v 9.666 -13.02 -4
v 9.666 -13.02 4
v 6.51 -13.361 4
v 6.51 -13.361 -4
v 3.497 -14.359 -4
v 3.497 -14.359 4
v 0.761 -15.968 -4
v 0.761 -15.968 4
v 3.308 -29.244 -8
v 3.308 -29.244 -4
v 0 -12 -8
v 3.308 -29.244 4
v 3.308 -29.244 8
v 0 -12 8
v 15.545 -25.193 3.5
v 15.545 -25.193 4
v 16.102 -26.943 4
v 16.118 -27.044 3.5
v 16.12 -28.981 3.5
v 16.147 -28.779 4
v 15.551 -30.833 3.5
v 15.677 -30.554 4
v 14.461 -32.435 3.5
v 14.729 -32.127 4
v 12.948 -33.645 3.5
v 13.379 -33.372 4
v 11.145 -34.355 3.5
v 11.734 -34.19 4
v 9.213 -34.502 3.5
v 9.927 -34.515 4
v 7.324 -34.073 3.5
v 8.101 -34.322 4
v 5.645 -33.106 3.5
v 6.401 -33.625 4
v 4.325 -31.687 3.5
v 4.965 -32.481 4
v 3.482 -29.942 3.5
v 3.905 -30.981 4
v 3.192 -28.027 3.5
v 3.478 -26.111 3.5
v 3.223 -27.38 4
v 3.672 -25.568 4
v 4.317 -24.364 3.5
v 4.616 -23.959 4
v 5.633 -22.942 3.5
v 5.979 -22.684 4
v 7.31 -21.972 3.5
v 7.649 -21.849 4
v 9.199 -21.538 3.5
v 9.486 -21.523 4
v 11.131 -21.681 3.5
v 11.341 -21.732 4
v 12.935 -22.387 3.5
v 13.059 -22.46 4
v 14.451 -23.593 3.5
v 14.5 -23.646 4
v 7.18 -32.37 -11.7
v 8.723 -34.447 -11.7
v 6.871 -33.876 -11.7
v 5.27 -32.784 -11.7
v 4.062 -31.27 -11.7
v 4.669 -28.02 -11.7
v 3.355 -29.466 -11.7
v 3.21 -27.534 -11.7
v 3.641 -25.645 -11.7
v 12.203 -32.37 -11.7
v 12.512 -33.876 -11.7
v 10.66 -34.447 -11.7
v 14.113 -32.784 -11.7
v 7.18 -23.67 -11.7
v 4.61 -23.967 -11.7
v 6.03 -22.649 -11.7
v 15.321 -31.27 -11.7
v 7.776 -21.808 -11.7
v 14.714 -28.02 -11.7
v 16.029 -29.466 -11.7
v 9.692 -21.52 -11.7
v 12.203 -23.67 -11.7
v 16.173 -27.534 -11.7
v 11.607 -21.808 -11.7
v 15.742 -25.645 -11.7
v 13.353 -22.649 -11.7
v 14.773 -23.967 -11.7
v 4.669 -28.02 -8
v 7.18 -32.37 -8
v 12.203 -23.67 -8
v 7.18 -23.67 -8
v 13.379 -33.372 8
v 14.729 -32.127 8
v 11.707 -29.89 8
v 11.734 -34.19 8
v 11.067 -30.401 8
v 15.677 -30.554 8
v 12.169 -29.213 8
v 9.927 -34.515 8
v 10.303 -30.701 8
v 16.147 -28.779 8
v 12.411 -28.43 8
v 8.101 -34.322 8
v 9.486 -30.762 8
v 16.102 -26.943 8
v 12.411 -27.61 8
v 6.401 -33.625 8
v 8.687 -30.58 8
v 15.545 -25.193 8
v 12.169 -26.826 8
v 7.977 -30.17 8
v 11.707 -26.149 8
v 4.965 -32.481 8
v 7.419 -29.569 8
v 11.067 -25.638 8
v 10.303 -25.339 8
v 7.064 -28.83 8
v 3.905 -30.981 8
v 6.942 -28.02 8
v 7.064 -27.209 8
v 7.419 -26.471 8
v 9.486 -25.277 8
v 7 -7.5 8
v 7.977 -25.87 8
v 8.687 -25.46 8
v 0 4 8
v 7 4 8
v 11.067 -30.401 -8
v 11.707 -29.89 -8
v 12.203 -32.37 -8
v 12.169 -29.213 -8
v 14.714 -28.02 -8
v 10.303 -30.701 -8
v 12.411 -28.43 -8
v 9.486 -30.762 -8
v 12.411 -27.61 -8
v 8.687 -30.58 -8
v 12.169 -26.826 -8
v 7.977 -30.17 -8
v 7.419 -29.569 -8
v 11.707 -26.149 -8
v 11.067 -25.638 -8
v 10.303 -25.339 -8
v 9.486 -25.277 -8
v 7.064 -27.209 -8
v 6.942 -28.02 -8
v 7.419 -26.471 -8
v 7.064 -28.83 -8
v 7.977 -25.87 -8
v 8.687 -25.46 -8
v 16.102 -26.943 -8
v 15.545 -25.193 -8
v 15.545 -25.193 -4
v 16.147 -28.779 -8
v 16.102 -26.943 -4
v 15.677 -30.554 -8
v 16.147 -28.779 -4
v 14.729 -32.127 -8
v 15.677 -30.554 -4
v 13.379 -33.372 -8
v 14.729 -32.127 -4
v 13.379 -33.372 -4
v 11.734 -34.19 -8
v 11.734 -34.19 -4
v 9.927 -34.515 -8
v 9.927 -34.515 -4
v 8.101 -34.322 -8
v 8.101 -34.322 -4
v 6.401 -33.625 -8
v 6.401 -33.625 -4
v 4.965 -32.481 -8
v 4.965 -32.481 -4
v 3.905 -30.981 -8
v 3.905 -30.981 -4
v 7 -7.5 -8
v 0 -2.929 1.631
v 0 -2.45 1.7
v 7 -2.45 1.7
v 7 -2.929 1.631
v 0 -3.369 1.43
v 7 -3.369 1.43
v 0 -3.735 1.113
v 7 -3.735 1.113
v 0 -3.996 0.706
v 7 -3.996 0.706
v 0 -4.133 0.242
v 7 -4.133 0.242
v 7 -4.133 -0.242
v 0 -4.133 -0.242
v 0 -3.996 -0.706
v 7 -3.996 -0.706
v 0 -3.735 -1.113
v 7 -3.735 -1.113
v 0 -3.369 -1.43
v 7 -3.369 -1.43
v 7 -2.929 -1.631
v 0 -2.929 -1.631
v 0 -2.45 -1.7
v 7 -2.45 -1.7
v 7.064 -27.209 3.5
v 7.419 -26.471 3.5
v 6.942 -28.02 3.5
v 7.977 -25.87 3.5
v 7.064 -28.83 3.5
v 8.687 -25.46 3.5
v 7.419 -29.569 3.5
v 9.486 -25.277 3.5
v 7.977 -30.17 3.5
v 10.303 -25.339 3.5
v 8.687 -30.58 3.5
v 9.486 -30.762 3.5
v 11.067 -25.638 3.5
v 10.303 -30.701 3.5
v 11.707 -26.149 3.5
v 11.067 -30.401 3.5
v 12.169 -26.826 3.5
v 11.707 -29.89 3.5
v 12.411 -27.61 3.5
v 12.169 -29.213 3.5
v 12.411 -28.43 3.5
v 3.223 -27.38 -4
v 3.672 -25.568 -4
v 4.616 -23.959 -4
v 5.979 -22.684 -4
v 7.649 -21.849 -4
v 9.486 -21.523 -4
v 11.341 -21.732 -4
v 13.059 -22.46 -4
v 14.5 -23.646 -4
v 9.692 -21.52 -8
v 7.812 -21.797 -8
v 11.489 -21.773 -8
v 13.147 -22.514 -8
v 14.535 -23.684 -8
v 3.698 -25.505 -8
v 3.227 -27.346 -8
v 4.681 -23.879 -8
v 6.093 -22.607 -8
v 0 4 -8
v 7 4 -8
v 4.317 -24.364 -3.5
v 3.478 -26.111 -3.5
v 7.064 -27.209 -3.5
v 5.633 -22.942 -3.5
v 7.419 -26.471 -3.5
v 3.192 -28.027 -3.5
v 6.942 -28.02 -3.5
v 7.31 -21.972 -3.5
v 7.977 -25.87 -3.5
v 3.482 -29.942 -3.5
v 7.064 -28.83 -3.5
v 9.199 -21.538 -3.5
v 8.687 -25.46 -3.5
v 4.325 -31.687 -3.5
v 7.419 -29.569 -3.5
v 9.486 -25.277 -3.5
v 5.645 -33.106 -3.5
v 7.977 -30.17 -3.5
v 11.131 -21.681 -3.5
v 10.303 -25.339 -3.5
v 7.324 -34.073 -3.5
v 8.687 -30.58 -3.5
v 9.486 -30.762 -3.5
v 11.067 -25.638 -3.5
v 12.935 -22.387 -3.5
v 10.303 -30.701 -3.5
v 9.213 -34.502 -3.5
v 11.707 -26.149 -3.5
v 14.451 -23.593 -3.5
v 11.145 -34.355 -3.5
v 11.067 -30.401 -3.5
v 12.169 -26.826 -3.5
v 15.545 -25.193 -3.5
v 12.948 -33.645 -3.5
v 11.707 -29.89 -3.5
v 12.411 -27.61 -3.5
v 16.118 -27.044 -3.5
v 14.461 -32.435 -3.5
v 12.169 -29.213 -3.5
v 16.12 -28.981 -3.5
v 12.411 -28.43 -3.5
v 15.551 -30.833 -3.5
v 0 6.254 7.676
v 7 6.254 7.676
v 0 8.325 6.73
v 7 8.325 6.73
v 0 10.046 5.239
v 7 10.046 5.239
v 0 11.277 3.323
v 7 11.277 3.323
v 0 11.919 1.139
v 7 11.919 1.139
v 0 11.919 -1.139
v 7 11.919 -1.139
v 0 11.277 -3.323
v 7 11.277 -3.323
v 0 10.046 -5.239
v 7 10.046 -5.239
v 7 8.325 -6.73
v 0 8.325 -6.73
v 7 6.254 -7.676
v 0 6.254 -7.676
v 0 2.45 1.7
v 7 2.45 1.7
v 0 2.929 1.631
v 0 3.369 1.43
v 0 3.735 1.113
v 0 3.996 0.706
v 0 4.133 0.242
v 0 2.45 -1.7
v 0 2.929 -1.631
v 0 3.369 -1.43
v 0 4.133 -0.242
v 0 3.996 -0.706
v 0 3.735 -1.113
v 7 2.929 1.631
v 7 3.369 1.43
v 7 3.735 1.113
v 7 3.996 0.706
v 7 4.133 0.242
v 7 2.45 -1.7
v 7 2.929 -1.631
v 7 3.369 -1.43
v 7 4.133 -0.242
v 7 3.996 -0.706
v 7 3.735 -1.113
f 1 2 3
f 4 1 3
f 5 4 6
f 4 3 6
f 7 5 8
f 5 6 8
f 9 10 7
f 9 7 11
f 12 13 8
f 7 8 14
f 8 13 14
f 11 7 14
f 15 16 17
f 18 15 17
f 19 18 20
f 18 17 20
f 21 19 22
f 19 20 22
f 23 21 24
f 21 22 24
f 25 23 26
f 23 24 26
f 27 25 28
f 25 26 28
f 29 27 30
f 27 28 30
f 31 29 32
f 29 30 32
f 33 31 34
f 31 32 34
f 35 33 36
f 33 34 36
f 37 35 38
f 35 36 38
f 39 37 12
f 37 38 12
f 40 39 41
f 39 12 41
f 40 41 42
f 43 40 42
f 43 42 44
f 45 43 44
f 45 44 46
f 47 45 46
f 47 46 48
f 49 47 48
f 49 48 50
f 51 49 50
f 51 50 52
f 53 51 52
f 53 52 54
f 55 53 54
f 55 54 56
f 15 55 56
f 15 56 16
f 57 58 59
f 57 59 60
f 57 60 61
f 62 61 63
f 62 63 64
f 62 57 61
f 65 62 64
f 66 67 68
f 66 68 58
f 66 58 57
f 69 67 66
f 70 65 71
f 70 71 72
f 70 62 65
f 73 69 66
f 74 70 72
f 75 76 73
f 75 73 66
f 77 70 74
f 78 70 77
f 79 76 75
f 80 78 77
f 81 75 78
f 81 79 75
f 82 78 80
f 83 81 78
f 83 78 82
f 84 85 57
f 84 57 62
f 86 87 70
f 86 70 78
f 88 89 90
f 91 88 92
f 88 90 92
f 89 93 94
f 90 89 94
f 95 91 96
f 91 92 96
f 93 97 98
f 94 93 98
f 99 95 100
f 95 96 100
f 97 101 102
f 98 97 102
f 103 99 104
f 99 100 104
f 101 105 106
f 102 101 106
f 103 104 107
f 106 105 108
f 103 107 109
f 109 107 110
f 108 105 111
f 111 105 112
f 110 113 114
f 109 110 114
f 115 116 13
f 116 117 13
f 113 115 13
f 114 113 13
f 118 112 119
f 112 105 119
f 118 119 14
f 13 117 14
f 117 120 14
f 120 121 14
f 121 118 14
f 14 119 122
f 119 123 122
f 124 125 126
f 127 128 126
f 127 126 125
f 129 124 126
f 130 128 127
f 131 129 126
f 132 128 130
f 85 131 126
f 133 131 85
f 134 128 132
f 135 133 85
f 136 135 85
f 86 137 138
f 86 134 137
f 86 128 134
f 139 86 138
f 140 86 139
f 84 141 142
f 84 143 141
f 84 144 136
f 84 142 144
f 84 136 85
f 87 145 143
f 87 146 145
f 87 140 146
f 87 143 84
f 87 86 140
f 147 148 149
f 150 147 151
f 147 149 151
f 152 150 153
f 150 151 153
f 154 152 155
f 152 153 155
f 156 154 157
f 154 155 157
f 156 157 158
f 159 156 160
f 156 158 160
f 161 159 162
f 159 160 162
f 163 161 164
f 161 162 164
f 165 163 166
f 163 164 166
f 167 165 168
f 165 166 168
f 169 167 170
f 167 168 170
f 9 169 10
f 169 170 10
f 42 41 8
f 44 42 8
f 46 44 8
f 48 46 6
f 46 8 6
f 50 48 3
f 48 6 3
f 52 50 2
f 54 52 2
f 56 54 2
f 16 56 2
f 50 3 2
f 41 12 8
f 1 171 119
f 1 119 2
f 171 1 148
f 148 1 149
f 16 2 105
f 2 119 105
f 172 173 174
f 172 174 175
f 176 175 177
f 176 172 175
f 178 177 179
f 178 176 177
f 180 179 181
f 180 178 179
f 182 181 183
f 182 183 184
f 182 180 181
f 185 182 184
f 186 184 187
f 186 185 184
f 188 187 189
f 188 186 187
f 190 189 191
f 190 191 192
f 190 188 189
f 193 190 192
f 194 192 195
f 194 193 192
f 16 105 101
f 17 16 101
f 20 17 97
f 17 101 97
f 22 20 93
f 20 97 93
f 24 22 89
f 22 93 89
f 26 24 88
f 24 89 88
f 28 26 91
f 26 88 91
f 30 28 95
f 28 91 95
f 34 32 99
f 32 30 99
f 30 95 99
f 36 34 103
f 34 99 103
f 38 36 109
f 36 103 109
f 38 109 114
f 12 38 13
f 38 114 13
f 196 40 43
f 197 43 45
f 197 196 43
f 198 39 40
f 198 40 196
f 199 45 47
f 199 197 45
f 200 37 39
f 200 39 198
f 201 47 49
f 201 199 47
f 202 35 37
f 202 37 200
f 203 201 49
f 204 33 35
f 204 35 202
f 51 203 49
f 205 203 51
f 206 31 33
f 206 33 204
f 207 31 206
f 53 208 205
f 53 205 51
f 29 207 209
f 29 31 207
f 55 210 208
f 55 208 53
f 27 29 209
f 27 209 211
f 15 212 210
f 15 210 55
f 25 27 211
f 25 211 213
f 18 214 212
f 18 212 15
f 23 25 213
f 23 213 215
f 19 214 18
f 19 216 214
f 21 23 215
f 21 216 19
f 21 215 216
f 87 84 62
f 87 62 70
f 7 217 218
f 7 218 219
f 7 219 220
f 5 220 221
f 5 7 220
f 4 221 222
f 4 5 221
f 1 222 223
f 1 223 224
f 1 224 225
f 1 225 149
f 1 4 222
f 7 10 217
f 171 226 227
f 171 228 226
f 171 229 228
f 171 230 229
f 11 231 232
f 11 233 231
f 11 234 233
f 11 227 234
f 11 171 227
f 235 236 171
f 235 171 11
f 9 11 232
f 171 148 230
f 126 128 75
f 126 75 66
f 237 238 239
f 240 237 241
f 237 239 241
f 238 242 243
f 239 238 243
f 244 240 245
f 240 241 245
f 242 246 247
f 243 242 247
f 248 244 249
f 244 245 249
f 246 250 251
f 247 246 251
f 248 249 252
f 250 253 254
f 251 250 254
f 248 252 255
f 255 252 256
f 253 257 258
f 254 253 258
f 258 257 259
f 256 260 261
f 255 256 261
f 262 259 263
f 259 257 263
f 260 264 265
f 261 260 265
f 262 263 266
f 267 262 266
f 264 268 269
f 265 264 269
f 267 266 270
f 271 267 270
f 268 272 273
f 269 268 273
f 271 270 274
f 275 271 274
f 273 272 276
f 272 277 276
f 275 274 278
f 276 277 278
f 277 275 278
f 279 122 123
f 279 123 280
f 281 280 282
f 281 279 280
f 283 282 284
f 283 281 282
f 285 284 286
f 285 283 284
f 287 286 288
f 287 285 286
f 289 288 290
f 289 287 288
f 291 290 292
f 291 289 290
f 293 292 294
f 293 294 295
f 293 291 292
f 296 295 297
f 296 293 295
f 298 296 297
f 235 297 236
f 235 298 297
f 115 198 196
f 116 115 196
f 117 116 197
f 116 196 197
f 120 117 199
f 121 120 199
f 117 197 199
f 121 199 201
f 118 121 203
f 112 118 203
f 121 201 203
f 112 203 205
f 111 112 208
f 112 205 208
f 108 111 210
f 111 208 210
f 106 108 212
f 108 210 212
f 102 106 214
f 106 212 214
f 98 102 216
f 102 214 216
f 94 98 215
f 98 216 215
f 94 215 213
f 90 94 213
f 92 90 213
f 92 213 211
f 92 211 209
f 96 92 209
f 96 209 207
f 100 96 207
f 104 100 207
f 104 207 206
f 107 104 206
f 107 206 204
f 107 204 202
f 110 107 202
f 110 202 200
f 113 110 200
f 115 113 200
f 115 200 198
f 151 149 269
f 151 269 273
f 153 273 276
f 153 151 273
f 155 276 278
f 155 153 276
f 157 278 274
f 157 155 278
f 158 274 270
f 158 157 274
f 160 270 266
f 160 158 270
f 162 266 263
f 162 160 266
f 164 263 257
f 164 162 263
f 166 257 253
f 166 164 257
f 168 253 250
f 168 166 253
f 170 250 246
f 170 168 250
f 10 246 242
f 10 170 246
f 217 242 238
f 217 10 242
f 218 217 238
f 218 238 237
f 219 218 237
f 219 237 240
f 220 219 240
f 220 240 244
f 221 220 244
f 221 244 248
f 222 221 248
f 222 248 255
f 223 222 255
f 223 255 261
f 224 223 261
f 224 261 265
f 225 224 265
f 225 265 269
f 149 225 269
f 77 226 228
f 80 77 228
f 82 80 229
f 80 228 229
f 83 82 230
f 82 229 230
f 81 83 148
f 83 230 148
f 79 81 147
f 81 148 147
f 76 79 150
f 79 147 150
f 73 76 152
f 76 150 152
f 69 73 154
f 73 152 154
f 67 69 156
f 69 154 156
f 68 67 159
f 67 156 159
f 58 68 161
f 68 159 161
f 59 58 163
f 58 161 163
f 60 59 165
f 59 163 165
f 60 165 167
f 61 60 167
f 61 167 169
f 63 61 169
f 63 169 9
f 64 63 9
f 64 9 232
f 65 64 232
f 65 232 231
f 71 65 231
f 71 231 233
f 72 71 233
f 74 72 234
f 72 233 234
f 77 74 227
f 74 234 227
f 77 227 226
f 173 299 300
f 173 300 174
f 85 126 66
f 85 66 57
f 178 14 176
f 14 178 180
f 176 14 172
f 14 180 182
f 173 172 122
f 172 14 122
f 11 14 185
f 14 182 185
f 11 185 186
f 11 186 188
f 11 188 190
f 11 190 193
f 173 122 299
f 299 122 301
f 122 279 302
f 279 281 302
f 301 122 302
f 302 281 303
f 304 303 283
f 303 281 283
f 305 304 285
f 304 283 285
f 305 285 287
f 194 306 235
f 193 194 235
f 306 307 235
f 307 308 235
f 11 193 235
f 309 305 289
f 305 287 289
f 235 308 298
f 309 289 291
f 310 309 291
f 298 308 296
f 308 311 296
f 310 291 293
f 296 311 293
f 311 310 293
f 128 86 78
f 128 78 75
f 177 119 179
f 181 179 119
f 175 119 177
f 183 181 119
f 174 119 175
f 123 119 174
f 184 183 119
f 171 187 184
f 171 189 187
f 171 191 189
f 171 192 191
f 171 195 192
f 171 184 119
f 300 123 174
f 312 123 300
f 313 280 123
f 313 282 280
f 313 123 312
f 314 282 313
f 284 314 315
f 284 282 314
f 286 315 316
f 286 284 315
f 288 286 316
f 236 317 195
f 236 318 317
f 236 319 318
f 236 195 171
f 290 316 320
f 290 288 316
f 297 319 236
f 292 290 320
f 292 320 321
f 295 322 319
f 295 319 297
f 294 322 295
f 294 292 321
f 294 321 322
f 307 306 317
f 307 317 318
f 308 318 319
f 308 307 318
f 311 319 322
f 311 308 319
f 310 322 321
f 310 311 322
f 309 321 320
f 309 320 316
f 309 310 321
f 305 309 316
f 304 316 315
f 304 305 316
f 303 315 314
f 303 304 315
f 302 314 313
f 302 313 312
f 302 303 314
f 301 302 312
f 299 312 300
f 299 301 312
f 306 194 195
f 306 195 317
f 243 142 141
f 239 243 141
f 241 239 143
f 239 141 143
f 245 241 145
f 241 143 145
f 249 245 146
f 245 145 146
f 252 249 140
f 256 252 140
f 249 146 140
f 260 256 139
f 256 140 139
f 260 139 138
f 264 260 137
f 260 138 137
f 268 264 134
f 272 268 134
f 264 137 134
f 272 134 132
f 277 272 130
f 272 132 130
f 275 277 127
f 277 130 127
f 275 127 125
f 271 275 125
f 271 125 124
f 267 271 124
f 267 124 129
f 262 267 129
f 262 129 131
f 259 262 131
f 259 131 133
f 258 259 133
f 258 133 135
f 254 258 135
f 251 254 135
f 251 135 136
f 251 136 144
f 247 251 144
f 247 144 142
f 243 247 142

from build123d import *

# Parameters (mm, degrees)
BOSS_EXTRU_1_DEPTH      = 7
D_GAGEMENT_M31_DEPTH    = 7
BOSS_EXTRU_3_DEPTH      = 7
BOSS_EXTRU_4_DEPTH      = 16
ESQUISSE8_R             = 15
ENL_V_MAT_EXTRU_1_DEPTH = 4
ESQUISSE9_R             = 6.5
BOSS_EXTRU_5_DEPTH      = 0.5
D_GAGEMENT_M51_D        = 5.5
ESQUISSE12_R            = 6.5
BOSS_EXTRU_6_DEPTH      = 3.7


# Read off the part's stored shape, not the designer's step: Dégagement M31
with BuildPart() as part:
    # Esquisse1 → Boss.-Extru.1 (new body)
    with BuildSketch(Plane(origin=(0, 0, 0), x_dir=(0, 0, -1), z_dir=(1, 0, 0))):
        with BuildLine():
            Line((8, 4), (8, -4))
            ThreePointArc((8, -4), (0, -12), (-8, -4))
            Line((-8, -4), (-8, 4))
            ThreePointArc((-8, 4), (0, 12), (8, 4))
        make_face()
    extrude(amount=BOSS_EXTRU_1_DEPTH)

    # Dégagement M31 outline → Dégagement M31 (cut)
    with BuildSketch(Plane.YZ):
        with BuildLine():
            Line((-2.45, -1.7), (2.45, -1.7))
            ThreePointArc((2.45, -1.7), (4.15, 0), (2.45, 1.7))
            Line((2.45, 1.7), (-2.45, 1.7))
            ThreePointArc((-2.45, 1.7), (-4.15, 0), (-2.45, -1.7))
        make_face()
    extrude(amount=D_GAGEMENT_M31_DEPTH, mode=Mode.SUBTRACT)

    # Esquisse6 → Boss.-Extru.3 (add, through all)
    with BuildSketch(Plane(origin=(7, 0, 0), x_dir=(0, 0, -1), z_dir=(1, 0, 0))):
        with BuildLine():
            ThreePointArc((-5e-09, -12), (-5.656854251, -9.656854248), (-8, -4))
            Line((-8, -4), (-8, -12))
            Line((-8, -12), (-5e-09, -12))
        make_face()
        with BuildLine():
            ThreePointArc((8, -4), (5.656854248, -9.656854251), (-5e-09, -12))
            Line((-5e-09, -12), (8, -12))
            Line((8, -12), (8, -4))
        make_face()
    extrude(amount=-BOSS_EXTRU_3_DEPTH)

    # Esquisse7 → Boss.-Extru.4 (add, through all)
    with BuildSketch(Plane.XY.offset(8)):
        with BuildLine():
            Line((3.307940197, -29.244206061), (0, -12))
            Line((0, -12), (7, -12))
            Line((7, -12), (7, -7.5))
            Line((7, -7.5), (15.544704758, -25.192887251))
            ThreePointArc((15.544704758, -25.192887251), (11.734497019, -34.190248899), (3.307940197, -29.244206061))
        make_face()
    extrude(amount=-BOSS_EXTRU_4_DEPTH)

    # Esquisse8 → Enlèv. mat.-Extru.1 (cut, symmetric)
    with BuildSketch(Plane.XY):
        with Locations((9.69154802, -28.01964444)):
            Circle(ESQUISSE8_R)
    extrude(amount=ENL_V_MAT_EXTRU_1_DEPTH, both=True, mode=Mode.SUBTRACT)

    # Esquisse9 → Boss.-Extru.5 (add)
    with BuildSketch(Plane(origin=(0, 0, 4), x_dir=(-1, 0, 0), z_dir=(0, 0, -1))):
        with Locations(Location((-9.69154802, -28.01964444, 0), (0, 0, 154.221977628))):
            Circle(ESQUISSE9_R)
    boss_extru_5 = extrude(amount=BOSS_EXTRU_5_DEPTH)

    # Symétrie1: Boss.-Extru.5 across plane
    add(boss_extru_5.mirror(Plane.XY))

    # Dégagement M51 (through all)
    with Locations(Plane.XY.offset(8)):
        with Locations((9.69154802, -28.01964444)):
            Hole(D_GAGEMENT_M51_D / 2)

    # Esquisse12 → Boss.-Extru.6 (add)
    with BuildSketch(Plane(origin=(0, 0, -8), x_dir=(-1, 0, 0), z_dir=(0, 0, -1))):
        with Locations(Location((-9.69154802, -28.01964444, 0), (0, 0, 90))):
            Circle(ESQUISSE12_R)
        Polygon((-4.668600678, -28.01964444), (-7.180074349, -23.66964444), (-12.203021691, -23.66964444), (-14.714495362, -28.01964444), (-12.203021691, -32.36964444), (-7.180074349, -32.36964444), align=None, mode=Mode.SUBTRACT)
    extrude(amount=BOSS_EXTRU_6_DEPTH)


solid = part.part
